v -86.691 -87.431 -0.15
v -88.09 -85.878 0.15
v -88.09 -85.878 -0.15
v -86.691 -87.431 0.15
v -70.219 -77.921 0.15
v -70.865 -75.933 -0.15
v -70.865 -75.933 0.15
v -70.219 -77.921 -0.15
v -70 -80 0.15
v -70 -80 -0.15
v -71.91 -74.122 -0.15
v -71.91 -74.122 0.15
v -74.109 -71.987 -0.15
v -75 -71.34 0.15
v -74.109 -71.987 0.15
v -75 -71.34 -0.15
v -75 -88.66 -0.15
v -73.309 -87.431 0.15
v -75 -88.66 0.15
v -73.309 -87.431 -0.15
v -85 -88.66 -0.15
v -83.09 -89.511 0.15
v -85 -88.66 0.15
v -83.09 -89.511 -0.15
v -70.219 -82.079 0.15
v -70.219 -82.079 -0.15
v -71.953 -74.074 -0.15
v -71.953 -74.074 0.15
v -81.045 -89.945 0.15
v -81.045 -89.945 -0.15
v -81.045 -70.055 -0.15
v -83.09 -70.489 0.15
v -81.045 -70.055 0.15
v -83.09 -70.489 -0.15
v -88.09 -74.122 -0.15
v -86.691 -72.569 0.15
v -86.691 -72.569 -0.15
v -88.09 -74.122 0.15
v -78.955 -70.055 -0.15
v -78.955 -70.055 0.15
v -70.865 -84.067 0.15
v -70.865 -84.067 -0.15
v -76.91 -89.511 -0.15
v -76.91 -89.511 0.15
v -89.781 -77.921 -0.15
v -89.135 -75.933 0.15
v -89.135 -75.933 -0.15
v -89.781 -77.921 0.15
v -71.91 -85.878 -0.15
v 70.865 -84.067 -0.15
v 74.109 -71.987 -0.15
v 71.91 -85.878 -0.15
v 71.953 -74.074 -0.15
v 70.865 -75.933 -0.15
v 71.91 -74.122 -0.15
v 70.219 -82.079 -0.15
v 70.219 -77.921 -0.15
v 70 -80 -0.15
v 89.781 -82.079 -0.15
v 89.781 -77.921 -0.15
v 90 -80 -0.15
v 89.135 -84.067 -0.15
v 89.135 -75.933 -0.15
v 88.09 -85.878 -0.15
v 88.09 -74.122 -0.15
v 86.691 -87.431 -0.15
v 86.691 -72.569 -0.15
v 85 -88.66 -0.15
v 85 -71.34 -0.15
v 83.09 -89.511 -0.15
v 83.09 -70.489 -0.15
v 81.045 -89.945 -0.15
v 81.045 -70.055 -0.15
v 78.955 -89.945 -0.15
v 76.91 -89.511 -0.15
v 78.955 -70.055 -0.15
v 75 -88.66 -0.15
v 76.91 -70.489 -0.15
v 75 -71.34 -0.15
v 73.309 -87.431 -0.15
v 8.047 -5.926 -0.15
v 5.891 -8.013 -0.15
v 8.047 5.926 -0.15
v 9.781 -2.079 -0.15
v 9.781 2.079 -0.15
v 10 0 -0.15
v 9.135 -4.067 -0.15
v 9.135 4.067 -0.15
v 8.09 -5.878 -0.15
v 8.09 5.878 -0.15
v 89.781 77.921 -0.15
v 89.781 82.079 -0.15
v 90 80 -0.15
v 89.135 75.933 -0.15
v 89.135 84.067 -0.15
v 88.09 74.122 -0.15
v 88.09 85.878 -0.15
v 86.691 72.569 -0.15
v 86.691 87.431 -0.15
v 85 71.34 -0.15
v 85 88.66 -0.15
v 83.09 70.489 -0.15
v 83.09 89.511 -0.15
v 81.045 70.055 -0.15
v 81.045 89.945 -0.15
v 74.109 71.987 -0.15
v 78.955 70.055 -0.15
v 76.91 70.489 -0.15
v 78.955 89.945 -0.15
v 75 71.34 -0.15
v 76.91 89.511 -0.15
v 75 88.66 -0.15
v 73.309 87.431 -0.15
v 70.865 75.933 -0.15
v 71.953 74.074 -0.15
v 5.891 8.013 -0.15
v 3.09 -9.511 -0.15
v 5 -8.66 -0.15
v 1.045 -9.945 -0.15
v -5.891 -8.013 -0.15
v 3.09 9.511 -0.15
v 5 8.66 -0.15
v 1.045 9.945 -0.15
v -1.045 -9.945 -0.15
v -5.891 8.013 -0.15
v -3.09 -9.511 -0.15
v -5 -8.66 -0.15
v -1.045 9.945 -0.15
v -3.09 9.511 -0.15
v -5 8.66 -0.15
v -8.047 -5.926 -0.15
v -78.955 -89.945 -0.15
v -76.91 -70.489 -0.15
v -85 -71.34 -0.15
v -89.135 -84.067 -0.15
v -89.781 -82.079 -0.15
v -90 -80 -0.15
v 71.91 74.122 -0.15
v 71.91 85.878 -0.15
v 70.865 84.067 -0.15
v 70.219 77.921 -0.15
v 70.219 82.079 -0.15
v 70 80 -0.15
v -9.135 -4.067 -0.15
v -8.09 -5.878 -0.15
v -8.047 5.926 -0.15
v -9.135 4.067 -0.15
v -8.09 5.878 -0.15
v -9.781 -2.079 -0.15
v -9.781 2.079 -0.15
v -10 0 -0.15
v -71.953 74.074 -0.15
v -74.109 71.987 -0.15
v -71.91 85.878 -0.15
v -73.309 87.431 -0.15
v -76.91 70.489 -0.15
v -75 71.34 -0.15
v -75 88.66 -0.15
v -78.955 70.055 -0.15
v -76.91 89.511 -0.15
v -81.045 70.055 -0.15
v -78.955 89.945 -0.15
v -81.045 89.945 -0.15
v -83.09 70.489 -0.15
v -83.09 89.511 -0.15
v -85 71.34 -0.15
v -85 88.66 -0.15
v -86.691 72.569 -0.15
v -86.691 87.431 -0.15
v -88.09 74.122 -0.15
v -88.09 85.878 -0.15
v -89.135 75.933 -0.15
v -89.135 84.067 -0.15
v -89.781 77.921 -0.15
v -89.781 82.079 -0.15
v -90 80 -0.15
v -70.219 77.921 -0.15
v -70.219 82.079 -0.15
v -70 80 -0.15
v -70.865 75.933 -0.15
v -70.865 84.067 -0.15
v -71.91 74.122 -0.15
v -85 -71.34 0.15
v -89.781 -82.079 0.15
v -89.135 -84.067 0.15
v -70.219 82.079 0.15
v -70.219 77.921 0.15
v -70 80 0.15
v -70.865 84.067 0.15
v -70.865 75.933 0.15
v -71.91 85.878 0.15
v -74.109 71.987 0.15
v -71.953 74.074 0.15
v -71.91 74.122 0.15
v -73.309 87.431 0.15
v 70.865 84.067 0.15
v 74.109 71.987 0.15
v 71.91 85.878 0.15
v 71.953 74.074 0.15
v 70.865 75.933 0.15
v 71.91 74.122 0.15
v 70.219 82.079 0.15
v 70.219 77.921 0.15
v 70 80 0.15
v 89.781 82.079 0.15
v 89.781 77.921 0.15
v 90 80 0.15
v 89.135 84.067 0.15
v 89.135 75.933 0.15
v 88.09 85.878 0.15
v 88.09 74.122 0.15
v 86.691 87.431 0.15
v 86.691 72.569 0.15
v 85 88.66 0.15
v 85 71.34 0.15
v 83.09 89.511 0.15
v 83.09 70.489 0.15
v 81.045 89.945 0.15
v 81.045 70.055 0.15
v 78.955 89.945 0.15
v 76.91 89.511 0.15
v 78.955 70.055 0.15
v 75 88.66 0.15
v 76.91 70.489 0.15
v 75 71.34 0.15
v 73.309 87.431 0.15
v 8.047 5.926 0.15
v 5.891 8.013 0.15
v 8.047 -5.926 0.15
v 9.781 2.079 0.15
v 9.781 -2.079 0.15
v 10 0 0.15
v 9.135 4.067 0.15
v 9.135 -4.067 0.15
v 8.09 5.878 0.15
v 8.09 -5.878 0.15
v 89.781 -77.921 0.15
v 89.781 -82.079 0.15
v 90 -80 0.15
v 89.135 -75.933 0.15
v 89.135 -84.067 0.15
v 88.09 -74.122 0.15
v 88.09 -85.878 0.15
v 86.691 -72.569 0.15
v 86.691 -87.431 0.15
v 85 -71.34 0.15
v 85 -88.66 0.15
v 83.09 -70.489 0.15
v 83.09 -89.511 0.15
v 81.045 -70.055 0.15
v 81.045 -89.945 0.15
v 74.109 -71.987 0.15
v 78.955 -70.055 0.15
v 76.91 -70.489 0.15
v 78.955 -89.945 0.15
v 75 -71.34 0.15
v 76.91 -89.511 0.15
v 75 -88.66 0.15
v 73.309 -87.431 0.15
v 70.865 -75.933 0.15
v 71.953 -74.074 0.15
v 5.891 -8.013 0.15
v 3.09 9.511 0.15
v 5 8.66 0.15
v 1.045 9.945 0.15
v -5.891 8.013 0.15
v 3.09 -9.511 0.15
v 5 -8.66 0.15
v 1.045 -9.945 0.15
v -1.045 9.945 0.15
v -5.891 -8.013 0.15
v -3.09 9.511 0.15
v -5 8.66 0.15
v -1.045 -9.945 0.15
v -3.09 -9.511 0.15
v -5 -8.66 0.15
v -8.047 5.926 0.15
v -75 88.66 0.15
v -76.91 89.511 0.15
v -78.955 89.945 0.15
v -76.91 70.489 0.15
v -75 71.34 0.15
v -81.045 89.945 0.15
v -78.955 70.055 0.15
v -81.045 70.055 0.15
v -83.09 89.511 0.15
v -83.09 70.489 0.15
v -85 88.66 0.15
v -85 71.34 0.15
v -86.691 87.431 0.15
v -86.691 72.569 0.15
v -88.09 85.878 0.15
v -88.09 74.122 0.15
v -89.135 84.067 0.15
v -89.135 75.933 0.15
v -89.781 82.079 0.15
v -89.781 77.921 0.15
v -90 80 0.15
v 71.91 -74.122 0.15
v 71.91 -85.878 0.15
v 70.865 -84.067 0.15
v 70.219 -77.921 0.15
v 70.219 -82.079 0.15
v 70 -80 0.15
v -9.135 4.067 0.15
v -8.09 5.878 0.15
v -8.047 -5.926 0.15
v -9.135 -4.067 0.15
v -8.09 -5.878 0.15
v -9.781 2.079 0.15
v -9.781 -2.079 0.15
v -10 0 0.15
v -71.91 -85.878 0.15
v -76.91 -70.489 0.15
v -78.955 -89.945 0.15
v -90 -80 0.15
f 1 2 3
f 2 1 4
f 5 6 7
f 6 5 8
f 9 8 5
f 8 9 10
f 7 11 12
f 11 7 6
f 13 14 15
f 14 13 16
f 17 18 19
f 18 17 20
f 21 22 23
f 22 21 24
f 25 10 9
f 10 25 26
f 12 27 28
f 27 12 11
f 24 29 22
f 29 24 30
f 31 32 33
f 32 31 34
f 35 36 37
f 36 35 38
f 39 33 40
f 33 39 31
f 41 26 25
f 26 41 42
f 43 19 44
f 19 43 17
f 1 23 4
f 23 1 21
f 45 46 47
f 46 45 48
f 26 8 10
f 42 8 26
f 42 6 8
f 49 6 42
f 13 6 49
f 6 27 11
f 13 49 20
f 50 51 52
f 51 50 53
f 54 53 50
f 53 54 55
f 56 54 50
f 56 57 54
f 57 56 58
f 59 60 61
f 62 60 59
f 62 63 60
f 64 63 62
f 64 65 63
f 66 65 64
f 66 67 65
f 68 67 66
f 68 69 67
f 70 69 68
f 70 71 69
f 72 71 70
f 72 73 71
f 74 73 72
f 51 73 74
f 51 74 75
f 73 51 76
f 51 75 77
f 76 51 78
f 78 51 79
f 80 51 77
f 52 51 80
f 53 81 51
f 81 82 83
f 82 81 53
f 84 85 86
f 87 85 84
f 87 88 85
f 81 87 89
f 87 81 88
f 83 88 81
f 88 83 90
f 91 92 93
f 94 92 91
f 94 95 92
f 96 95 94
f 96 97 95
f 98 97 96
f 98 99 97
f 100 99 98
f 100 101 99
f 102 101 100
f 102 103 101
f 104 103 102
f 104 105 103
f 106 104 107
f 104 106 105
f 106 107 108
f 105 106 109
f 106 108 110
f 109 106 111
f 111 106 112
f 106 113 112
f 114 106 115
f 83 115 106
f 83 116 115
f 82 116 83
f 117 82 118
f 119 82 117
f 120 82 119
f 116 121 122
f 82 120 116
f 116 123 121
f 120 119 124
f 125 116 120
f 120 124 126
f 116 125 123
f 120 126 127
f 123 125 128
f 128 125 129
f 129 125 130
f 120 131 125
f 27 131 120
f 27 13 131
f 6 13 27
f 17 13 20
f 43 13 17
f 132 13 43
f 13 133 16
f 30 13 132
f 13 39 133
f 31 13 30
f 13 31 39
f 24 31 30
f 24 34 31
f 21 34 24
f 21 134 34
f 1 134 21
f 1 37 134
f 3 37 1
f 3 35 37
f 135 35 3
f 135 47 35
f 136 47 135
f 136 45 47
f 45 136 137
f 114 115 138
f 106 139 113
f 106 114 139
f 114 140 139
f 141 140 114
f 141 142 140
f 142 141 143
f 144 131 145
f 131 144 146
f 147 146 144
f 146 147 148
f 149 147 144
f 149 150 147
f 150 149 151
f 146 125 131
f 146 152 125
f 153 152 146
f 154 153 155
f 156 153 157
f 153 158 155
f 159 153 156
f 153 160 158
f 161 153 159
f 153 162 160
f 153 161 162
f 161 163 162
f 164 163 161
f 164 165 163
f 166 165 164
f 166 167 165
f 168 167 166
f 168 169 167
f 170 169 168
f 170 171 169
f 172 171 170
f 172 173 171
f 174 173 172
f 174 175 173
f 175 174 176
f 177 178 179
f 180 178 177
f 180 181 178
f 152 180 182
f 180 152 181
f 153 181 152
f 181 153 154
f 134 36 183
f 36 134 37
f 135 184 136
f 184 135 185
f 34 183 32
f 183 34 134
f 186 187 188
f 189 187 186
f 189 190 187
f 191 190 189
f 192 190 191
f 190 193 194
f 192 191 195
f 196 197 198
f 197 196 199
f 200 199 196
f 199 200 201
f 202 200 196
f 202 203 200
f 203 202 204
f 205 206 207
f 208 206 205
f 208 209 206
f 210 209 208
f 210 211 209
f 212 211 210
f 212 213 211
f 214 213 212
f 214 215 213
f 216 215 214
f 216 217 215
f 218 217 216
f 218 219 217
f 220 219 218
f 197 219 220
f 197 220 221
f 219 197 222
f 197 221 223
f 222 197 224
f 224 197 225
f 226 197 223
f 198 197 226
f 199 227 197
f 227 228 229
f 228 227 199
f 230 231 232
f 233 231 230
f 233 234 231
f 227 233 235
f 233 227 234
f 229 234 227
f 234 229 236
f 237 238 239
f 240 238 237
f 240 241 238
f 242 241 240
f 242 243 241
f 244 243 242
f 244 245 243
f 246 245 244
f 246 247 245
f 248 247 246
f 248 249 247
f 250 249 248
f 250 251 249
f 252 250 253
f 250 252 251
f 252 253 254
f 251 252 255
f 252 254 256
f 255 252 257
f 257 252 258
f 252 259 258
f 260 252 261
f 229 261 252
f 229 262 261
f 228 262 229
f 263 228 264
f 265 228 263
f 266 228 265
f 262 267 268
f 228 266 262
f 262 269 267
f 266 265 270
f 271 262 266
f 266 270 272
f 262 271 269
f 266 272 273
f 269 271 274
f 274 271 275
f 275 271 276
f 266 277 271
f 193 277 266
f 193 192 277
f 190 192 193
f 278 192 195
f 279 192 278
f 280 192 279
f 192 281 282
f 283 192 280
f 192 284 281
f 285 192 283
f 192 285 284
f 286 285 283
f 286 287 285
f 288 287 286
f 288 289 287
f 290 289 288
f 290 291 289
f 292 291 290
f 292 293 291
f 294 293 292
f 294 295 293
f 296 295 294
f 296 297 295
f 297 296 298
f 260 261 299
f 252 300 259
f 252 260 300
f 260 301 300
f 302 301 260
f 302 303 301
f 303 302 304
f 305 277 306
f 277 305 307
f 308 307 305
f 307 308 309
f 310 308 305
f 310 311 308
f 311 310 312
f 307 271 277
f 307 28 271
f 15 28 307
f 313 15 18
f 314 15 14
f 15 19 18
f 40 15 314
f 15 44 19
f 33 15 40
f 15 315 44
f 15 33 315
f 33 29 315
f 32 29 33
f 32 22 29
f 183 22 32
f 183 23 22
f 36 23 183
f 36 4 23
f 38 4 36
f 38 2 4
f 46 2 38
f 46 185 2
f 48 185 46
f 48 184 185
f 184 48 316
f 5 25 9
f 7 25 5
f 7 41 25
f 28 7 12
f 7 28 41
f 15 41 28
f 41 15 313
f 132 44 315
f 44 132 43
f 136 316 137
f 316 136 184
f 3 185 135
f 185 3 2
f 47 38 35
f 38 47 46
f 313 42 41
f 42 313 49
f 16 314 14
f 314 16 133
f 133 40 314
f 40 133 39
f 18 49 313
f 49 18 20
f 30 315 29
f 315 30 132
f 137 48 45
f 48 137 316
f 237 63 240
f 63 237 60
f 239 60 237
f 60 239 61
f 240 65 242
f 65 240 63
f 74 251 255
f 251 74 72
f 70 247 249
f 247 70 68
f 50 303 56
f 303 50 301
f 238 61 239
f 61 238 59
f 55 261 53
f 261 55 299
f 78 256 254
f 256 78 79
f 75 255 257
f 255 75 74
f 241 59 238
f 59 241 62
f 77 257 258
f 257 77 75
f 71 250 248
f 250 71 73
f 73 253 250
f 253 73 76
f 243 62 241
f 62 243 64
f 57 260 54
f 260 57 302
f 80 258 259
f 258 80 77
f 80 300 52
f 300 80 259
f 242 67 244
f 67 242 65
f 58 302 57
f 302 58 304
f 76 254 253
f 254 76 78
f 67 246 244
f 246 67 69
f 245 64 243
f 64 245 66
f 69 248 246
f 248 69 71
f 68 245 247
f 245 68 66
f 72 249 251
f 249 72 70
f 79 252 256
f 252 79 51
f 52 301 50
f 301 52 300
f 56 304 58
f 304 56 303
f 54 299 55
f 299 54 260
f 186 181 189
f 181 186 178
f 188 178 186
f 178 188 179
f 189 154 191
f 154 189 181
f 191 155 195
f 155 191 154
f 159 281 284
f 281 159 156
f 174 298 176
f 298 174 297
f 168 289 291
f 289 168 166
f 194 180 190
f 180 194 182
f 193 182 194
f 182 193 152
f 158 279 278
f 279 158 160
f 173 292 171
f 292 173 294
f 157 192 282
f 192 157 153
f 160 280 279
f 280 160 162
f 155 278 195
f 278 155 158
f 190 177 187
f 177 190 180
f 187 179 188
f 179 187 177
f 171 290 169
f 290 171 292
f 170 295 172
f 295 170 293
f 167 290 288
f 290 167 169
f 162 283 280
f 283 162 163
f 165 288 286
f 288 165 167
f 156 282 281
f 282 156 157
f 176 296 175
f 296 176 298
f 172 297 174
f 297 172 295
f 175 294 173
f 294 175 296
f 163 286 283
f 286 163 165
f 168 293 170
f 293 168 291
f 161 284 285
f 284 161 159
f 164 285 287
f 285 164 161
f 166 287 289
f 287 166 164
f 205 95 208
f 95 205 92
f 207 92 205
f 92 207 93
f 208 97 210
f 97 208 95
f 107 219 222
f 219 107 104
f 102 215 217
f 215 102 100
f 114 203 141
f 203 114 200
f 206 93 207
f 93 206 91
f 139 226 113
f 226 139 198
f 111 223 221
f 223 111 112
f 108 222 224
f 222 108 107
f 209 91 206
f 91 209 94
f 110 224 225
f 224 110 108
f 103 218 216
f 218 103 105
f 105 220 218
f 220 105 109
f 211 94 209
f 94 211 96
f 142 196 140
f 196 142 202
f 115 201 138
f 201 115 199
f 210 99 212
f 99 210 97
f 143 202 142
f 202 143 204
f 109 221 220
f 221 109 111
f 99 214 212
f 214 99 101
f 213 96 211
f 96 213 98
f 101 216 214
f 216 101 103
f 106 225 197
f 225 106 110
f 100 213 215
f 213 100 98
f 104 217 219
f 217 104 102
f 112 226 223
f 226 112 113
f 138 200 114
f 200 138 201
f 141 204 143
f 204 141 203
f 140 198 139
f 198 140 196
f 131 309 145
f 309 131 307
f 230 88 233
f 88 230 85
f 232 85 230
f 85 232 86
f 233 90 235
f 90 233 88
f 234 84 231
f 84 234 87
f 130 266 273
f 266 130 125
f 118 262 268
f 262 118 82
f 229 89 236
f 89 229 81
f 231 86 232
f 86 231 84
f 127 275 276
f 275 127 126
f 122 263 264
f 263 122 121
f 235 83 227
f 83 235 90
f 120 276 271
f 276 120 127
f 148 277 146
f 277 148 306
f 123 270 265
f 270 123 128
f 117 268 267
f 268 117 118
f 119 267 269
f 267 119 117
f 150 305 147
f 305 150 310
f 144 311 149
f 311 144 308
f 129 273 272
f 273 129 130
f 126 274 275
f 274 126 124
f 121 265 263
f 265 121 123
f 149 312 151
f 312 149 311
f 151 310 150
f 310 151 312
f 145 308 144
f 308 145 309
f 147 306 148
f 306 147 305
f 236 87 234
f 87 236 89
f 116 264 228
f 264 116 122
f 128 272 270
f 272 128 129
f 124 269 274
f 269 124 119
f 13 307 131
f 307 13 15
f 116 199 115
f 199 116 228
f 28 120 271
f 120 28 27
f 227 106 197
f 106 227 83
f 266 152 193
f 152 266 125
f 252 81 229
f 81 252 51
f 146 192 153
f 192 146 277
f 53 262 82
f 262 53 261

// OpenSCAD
/* [Size] */
size = 180; //[1:500]

circle_diameter = 20; //[1:50]

module fivePoint1stLayerPrintTest()
{
    rsize = circle_diameter/2;
    xpos= size/2 - rsize;
    ypos = size/2 - rsize;
    
    union() {
translate([-xpos,-ypos,0]){
      cylinder(r=rsize, h=0.3, center = true);
}
translate([xpos,-ypos,0]){
      cylinder(r=rsize, h=0.3, center = true);
}
translate([-xpos,ypos,0]){
      cylinder(r=rsize, h=0.3, center = true);
}
translate([xpos,ypos,0]){
      cylinder(r=rsize, h=0.3, center = true);
}
cylinder(r=rsize, h=0.3, center = true);

rotate([0,0,45])
      cube([(xpos+ypos)*1.4, 3, 0.3], center = true);
rotate([0,0,-45])
      cube([(xpos+ypos)*1.4, 3, 0.3], center = true);

    }
    
}

fivePoint1stLayerPrintTest();
